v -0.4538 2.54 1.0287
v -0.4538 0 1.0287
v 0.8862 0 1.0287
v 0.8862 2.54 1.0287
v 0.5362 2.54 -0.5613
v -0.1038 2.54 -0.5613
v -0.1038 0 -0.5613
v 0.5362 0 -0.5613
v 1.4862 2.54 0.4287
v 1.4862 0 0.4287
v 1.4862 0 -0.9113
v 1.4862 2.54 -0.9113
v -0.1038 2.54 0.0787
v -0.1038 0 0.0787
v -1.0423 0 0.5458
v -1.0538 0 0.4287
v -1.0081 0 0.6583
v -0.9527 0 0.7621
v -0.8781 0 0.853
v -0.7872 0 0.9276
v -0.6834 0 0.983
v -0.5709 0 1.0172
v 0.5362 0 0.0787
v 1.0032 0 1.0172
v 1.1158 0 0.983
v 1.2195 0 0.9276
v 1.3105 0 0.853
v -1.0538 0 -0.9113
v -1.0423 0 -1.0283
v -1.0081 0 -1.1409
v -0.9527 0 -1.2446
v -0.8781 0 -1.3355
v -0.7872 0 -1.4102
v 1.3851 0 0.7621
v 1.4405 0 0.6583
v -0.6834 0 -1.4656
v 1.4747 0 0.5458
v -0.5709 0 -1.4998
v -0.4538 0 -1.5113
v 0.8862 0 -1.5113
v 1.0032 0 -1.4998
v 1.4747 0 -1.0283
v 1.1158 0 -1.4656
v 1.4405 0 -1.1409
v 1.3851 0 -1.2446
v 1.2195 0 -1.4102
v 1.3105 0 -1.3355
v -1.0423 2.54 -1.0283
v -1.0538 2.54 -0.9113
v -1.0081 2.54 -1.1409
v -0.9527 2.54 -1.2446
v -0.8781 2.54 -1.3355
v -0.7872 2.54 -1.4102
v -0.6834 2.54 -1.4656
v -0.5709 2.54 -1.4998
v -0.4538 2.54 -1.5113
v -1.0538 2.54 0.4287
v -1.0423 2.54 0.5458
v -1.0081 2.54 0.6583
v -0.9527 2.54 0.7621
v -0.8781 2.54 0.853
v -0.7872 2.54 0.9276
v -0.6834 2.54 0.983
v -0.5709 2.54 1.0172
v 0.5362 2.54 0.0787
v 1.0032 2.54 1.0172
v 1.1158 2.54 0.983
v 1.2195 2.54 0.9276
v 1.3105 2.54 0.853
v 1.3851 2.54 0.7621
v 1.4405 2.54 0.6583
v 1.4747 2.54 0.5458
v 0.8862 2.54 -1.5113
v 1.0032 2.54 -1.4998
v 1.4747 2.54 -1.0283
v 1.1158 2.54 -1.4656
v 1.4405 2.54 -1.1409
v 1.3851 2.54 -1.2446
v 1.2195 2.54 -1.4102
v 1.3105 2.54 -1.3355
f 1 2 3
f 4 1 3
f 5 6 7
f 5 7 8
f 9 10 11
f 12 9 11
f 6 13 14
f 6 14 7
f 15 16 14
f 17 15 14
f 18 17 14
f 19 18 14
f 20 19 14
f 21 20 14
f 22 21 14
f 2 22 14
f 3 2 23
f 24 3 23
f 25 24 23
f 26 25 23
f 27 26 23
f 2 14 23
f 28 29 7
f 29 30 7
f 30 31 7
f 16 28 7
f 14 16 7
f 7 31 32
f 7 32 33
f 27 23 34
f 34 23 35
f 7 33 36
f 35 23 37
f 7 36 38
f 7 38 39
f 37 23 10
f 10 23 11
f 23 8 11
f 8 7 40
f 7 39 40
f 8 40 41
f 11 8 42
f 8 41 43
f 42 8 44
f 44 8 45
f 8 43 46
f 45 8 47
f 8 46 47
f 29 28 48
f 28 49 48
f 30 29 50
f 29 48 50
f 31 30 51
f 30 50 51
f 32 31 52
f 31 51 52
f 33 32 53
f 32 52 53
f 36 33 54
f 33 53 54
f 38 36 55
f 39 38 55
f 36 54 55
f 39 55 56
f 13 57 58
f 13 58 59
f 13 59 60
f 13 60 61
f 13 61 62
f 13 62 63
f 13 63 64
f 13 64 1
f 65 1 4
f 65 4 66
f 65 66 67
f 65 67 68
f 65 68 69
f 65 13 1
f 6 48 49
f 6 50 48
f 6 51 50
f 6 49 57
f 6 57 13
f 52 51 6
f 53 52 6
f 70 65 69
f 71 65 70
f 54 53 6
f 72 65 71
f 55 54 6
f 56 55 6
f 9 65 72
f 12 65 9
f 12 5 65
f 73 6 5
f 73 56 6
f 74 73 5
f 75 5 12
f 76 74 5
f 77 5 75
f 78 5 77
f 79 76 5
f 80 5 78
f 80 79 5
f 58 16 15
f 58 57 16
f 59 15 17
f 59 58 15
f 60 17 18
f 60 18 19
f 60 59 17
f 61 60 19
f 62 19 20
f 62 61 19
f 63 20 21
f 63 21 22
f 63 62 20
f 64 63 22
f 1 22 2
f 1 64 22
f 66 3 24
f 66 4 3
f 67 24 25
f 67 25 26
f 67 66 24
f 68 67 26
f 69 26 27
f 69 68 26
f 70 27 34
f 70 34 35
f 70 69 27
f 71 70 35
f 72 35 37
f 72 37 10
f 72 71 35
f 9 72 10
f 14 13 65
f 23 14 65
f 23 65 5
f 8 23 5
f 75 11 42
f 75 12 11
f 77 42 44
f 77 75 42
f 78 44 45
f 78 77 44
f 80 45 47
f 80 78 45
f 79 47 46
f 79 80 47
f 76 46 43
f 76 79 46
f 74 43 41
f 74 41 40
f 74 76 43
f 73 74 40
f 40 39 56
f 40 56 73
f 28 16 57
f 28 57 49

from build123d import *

# Parameters (mm, degrees)
SKETCH1_W           = 2.54
SKETCH1_H           = 2.54
BOSS_EXTRUDE1_DEPTH = 2.54
SKETCH2_W           = 0.64
SKETCH2_H           = 0.64
CUT_EXTRUDE1_DEPTH  = 2.54
FILLET2_R           = 0.6
FILLET3_R           = 0.6
FILLET4_R           = 0.6
FILLET5_R           = 0.6


with BuildPart() as part:
    # Sketch1 → Boss-Extrude1 (new body)
    with BuildSketch(Plane(origin=(0, 0, 0), x_dir=(1, 0, 0), z_dir=(0, 1, 0))):
        with Locations((0.216186367, 0.241282018)):
            Rectangle(SKETCH1_W, SKETCH1_H)
    extrude(amount=BOSS_EXTRUDE1_DEPTH)

    # Sketch2 → Cut-Extrude1 (cut)
    with BuildSketch(Plane(origin=(0, 2.54, 0), x_dir=(1, 0, 0), z_dir=(0, 1, 0))):
        with Locations((0.216186367, 0.241282018)):
            Rectangle(SKETCH2_W, SKETCH2_H)
    extrude(amount=-CUT_EXTRUDE1_DEPTH, mode=Mode.SUBTRACT)

    # Fillet2
    fillet2_edges = [part.edges().sort_by_distance(p)[0] for p in [
        (-1.053813633, 1.27, -1.511282018),
    ]]
    fillet(fillet2_edges, radius=FILLET2_R)

    # Fillet3
    fillet3_edges = [part.edges().sort_by_distance(p)[0] for p in [
        (-1.053813633, 1.27, 1.028717982),
    ]]
    fillet(fillet3_edges, radius=FILLET3_R)

    # Fillet4
    fillet4_edges = [part.edges().sort_by_distance(p)[0] for p in [
        (1.486186367, 1.27, 1.028717982),
    ]]
    fillet(fillet4_edges, radius=FILLET4_R)

    # Fillet5
    fillet5_edges = [part.edges().sort_by_distance(p)[0] for p in [
        (1.486186367, 1.27, -1.511282018),
    ]]
    fillet(fillet5_edges, radius=FILLET5_R)


solid = part.part
